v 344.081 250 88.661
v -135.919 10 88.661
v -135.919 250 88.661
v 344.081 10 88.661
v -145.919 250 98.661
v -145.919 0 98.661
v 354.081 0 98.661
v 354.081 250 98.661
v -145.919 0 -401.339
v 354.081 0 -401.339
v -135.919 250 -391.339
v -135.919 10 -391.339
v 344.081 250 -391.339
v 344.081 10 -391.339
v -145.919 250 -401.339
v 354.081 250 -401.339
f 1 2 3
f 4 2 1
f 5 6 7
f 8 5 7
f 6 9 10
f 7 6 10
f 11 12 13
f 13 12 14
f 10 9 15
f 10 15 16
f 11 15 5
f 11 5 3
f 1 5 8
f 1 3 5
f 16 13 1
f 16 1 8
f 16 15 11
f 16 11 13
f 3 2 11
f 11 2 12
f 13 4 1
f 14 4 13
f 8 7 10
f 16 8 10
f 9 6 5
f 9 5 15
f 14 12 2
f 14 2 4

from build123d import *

# Parameters (mm, degrees)
ESQUISSE1_W        = 500
ESQUISSE1_H        = 500
BOSS_EXTRU_1_DEPTH = 250
COQUE1_T           = -10


with BuildPart() as part:
    # Esquisse1 → Boss.-Extru.1 (new body)
    with BuildSketch(Plane(origin=(0, 0, 0), x_dir=(1, 0, 0), z_dir=(0, 1, 0))):
        with Locations((104.080562725, 151.338562297)):
            Rectangle(ESQUISSE1_W, ESQUISSE1_H)
    extrude(amount=BOSS_EXTRU_1_DEPTH)

    # Coque1
    coque1_openings = [part.faces().sort_by_distance(p)[0] for p in [
        (104.080562725, 250, -151.338562297),
    ]]
    offset(amount=COQUE1_T, openings=coque1_openings, kind=Kind.INTERSECTION)


solid = part.part
